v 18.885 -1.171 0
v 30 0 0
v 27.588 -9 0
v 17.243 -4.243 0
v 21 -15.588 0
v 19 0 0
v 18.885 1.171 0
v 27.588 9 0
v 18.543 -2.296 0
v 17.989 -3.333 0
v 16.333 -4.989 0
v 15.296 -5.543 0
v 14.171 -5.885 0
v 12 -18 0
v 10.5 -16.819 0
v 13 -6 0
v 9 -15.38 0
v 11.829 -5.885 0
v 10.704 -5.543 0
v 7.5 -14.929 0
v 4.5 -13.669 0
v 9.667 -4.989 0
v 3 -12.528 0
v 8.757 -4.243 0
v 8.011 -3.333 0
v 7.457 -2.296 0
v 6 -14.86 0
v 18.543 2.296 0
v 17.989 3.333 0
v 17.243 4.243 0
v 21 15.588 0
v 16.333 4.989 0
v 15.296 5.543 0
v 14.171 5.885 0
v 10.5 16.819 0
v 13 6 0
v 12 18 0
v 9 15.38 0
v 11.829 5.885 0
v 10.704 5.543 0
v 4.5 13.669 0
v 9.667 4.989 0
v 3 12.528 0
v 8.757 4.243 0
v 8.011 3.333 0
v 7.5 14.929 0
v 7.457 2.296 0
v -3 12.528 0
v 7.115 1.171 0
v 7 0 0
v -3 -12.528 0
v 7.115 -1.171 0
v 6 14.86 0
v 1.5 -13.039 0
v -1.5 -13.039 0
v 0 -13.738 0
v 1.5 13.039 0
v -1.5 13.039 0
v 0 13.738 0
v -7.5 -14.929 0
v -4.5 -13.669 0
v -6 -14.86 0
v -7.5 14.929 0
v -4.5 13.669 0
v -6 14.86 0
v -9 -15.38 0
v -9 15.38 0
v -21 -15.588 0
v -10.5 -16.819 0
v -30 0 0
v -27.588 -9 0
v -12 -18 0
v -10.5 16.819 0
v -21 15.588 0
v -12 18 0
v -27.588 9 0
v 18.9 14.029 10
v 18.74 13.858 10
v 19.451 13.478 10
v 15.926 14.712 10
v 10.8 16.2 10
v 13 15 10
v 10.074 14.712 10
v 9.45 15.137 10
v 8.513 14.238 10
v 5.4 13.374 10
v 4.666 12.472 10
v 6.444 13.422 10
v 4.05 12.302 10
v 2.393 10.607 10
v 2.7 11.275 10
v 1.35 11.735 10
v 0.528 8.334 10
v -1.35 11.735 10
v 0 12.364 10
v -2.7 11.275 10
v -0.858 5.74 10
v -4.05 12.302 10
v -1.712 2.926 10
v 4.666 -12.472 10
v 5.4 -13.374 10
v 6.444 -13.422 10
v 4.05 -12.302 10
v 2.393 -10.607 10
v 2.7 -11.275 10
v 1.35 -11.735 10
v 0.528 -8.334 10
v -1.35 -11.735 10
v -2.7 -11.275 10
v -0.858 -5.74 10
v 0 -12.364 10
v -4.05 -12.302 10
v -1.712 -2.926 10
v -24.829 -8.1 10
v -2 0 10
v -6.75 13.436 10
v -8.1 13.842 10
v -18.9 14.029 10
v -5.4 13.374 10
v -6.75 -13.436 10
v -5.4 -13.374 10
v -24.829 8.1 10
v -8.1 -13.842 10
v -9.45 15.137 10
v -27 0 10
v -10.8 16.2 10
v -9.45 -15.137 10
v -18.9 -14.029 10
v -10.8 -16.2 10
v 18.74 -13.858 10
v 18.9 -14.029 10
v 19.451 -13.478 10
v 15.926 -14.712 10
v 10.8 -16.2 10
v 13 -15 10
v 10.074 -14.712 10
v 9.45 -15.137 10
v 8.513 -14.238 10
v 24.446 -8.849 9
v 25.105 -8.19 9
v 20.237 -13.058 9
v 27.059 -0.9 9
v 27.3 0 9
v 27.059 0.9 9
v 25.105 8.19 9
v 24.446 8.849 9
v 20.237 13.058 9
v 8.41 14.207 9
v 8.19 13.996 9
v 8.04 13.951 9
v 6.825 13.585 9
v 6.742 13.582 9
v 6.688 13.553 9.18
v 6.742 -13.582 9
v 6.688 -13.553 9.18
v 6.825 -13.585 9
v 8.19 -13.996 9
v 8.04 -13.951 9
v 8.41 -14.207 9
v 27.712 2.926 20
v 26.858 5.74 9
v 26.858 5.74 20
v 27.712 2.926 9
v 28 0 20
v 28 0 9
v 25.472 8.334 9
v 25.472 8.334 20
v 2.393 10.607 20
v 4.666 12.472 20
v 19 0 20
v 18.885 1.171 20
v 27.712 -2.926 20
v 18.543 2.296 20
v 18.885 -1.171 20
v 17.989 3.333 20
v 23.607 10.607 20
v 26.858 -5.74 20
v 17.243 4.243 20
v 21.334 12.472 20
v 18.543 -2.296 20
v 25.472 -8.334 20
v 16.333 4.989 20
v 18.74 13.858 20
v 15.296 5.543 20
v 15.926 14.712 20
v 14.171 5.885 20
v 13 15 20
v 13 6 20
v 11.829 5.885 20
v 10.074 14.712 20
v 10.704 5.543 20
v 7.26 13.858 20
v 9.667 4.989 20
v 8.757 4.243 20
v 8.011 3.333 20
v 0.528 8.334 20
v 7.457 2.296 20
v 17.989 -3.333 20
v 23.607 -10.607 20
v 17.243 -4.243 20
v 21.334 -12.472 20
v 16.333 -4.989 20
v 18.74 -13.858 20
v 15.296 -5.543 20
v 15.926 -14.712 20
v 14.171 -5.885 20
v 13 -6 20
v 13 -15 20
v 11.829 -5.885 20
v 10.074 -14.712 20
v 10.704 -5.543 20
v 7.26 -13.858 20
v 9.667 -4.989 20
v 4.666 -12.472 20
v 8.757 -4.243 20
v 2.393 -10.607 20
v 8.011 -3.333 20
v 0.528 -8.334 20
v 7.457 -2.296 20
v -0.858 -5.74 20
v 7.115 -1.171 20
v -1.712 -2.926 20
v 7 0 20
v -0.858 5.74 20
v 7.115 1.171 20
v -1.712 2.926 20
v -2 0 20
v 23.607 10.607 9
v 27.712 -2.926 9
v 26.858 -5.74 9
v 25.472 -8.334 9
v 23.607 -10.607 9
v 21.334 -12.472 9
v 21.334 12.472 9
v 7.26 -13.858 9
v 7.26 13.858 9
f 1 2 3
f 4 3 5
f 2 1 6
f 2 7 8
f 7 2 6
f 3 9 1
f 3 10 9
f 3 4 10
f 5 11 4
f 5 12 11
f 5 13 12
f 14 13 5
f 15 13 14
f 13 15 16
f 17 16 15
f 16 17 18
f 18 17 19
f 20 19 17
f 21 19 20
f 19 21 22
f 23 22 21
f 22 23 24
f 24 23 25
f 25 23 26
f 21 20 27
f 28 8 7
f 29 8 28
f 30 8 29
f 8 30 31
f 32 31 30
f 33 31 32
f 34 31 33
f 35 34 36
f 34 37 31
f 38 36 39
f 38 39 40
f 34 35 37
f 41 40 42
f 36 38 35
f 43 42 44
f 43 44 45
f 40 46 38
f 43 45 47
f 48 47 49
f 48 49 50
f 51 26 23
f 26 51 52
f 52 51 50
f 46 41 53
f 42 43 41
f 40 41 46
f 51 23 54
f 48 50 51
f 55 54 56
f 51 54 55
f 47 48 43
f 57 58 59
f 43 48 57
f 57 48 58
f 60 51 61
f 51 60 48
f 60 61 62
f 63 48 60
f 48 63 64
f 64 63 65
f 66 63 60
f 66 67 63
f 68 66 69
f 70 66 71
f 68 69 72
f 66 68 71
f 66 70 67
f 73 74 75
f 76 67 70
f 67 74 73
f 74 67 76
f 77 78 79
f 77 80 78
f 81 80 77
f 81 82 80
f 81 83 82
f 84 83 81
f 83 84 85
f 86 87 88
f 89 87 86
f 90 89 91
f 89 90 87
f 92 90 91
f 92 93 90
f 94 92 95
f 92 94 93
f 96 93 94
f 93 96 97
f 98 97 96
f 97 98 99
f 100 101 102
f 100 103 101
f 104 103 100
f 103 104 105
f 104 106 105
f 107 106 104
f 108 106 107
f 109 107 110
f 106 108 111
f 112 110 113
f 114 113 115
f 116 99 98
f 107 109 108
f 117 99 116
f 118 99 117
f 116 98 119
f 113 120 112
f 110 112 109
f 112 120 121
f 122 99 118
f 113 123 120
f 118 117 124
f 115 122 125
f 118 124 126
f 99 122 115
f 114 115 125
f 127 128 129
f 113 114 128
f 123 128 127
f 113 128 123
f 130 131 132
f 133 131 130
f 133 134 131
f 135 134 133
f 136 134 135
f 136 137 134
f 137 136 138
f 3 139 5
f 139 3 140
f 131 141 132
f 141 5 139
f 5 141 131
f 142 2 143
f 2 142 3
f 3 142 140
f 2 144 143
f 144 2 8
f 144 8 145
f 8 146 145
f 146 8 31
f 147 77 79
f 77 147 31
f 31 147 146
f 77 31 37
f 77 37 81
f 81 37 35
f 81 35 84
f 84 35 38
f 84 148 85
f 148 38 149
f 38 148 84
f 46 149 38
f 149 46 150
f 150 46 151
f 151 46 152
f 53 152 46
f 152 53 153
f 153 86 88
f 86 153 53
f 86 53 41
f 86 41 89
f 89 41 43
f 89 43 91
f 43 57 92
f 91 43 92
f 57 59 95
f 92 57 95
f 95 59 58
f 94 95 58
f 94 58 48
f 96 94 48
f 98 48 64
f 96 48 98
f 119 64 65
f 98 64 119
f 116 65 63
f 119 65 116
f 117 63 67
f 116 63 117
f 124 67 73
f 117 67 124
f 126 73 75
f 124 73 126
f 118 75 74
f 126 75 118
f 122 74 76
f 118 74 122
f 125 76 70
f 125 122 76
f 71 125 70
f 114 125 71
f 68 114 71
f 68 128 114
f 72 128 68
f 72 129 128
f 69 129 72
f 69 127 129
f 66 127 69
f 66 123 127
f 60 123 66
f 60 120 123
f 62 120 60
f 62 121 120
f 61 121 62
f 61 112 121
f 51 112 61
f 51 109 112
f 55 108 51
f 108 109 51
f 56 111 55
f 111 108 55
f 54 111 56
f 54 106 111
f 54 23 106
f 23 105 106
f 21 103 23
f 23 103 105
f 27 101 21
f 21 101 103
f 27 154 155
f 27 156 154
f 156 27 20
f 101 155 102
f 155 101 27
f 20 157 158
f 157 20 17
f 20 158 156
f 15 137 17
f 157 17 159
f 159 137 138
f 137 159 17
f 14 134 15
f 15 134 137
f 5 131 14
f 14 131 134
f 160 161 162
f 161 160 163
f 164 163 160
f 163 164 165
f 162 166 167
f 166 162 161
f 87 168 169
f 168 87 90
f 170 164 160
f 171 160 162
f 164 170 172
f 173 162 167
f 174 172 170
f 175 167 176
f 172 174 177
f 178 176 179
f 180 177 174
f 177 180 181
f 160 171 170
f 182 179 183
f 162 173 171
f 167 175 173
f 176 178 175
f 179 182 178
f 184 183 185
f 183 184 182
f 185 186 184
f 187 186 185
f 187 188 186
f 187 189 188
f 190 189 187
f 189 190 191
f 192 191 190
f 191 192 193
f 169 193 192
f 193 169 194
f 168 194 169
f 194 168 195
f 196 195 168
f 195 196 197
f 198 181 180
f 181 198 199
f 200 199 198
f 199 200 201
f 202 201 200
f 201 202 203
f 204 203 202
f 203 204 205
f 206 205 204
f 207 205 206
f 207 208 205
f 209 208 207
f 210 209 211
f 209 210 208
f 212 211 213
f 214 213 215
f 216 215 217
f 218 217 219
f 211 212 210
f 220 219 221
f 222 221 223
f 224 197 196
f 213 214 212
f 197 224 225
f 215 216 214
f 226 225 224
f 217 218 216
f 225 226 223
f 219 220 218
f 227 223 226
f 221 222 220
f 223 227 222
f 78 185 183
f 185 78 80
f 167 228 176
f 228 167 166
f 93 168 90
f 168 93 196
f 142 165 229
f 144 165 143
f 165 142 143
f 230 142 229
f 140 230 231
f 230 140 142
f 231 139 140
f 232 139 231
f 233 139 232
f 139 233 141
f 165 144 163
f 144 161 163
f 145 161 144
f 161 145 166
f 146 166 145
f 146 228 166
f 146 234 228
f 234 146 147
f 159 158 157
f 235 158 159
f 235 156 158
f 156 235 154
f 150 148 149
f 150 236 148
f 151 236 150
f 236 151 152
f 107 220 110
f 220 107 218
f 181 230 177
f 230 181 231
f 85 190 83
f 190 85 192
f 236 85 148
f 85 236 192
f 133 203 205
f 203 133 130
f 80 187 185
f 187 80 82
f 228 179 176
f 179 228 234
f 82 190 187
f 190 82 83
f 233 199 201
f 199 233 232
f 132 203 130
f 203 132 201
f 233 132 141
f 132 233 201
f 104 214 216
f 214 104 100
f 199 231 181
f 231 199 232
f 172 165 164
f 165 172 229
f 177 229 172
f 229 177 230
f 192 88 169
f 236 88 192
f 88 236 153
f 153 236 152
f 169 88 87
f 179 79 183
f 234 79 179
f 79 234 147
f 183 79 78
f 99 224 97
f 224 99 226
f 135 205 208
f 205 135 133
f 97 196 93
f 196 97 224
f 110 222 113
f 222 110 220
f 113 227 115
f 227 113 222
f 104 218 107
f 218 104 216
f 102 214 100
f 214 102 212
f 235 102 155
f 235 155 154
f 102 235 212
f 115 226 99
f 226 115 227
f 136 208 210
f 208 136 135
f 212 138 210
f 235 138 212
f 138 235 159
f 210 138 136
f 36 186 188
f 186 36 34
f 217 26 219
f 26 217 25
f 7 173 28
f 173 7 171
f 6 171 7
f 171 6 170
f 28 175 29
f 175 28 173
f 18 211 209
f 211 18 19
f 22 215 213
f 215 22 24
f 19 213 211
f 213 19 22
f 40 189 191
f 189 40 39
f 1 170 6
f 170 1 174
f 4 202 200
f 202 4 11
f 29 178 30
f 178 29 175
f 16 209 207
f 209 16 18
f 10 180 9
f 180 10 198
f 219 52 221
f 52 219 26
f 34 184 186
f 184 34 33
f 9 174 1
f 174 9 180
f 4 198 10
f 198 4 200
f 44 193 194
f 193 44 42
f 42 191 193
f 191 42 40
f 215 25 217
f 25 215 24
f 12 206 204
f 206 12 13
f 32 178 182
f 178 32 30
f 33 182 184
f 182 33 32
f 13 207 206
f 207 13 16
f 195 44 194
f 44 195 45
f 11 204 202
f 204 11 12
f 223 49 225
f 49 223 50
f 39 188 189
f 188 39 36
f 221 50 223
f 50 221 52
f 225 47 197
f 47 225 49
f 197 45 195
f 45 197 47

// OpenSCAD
$fn = 32;

// ----------------------------------------------------------------------
// Handle: 60 x 36 mm grip, 10 mm thick
// ----------------------------------------------------------------------

// --- parameters (mm) ---
length = 60;              // grip length
width = 36;               // grip width
thickness = 10;           // grip thickness
waist = 0.72;             // width factor at the middle
draft = 0.9;              // top face scale of the extrusion
scallops = 4;             // finger rests per side
ripple = 0.06;            // depth factor of the finger rests
boss_d = 30;              // mounting boss diameter
boss_h = 10;              // mounting boss height
boss_hole_d = 12;         // screw clearance through the boss
boss_r = 13;              // boss centre from the grip centre

/* ergonomic grip outline, closed spline-like polygon in the XY plane */
grip = [[-12, 18], [-10.5, 16.819], [-9, 15.38], [-7.5, 14.929], [-6, 14.86], [-4.5, 13.669], [-3, 12.528], [-1.5, 13.039], [0, 13.738], [1.5, 13.039], [3, 12.528], [4.5, 13.669], [6, 14.86], [7.5, 14.929], [9, 15.38], [10.5, 16.819], [12, 18], [21, 15.588], [27.588, 9], [30, 0], [27.588, -9], [21, -15.588], [12, -18], [12, -18], [10.5, -16.819], [9, -15.38], [7.5, -14.929], [6, -14.86], [4.5, -13.669], [3, -12.528], [1.5, -13.039], [0, -13.738], [-1.5, -13.039], [-3, -12.528], [-4.5, -13.669], [-6, -14.86], [-7.5, -14.929], [-9, -15.38], [-10.5, -16.819], [-12, -18], [-21, -15.588], [-27.588, -9], [-30, 0], [-27.588, 9], [-21, 15.588], [-12, 18]];

module grip_body() {
  linear_extrude(height = thickness, scale = draft) polygon(grip);
}

module boss_body() {
  /* sunk 1 mm into the grip so the joint overlaps */
  translate([boss_r, 0, thickness - 1]) cylinder(h = boss_h + 1, d = boss_d);
}

difference() {
  union() {
    grip_body();
    boss_body();
  }
  translate([boss_r, 0, -1]) cylinder(h = thickness + boss_h + 2, d = boss_hole_d);
}
